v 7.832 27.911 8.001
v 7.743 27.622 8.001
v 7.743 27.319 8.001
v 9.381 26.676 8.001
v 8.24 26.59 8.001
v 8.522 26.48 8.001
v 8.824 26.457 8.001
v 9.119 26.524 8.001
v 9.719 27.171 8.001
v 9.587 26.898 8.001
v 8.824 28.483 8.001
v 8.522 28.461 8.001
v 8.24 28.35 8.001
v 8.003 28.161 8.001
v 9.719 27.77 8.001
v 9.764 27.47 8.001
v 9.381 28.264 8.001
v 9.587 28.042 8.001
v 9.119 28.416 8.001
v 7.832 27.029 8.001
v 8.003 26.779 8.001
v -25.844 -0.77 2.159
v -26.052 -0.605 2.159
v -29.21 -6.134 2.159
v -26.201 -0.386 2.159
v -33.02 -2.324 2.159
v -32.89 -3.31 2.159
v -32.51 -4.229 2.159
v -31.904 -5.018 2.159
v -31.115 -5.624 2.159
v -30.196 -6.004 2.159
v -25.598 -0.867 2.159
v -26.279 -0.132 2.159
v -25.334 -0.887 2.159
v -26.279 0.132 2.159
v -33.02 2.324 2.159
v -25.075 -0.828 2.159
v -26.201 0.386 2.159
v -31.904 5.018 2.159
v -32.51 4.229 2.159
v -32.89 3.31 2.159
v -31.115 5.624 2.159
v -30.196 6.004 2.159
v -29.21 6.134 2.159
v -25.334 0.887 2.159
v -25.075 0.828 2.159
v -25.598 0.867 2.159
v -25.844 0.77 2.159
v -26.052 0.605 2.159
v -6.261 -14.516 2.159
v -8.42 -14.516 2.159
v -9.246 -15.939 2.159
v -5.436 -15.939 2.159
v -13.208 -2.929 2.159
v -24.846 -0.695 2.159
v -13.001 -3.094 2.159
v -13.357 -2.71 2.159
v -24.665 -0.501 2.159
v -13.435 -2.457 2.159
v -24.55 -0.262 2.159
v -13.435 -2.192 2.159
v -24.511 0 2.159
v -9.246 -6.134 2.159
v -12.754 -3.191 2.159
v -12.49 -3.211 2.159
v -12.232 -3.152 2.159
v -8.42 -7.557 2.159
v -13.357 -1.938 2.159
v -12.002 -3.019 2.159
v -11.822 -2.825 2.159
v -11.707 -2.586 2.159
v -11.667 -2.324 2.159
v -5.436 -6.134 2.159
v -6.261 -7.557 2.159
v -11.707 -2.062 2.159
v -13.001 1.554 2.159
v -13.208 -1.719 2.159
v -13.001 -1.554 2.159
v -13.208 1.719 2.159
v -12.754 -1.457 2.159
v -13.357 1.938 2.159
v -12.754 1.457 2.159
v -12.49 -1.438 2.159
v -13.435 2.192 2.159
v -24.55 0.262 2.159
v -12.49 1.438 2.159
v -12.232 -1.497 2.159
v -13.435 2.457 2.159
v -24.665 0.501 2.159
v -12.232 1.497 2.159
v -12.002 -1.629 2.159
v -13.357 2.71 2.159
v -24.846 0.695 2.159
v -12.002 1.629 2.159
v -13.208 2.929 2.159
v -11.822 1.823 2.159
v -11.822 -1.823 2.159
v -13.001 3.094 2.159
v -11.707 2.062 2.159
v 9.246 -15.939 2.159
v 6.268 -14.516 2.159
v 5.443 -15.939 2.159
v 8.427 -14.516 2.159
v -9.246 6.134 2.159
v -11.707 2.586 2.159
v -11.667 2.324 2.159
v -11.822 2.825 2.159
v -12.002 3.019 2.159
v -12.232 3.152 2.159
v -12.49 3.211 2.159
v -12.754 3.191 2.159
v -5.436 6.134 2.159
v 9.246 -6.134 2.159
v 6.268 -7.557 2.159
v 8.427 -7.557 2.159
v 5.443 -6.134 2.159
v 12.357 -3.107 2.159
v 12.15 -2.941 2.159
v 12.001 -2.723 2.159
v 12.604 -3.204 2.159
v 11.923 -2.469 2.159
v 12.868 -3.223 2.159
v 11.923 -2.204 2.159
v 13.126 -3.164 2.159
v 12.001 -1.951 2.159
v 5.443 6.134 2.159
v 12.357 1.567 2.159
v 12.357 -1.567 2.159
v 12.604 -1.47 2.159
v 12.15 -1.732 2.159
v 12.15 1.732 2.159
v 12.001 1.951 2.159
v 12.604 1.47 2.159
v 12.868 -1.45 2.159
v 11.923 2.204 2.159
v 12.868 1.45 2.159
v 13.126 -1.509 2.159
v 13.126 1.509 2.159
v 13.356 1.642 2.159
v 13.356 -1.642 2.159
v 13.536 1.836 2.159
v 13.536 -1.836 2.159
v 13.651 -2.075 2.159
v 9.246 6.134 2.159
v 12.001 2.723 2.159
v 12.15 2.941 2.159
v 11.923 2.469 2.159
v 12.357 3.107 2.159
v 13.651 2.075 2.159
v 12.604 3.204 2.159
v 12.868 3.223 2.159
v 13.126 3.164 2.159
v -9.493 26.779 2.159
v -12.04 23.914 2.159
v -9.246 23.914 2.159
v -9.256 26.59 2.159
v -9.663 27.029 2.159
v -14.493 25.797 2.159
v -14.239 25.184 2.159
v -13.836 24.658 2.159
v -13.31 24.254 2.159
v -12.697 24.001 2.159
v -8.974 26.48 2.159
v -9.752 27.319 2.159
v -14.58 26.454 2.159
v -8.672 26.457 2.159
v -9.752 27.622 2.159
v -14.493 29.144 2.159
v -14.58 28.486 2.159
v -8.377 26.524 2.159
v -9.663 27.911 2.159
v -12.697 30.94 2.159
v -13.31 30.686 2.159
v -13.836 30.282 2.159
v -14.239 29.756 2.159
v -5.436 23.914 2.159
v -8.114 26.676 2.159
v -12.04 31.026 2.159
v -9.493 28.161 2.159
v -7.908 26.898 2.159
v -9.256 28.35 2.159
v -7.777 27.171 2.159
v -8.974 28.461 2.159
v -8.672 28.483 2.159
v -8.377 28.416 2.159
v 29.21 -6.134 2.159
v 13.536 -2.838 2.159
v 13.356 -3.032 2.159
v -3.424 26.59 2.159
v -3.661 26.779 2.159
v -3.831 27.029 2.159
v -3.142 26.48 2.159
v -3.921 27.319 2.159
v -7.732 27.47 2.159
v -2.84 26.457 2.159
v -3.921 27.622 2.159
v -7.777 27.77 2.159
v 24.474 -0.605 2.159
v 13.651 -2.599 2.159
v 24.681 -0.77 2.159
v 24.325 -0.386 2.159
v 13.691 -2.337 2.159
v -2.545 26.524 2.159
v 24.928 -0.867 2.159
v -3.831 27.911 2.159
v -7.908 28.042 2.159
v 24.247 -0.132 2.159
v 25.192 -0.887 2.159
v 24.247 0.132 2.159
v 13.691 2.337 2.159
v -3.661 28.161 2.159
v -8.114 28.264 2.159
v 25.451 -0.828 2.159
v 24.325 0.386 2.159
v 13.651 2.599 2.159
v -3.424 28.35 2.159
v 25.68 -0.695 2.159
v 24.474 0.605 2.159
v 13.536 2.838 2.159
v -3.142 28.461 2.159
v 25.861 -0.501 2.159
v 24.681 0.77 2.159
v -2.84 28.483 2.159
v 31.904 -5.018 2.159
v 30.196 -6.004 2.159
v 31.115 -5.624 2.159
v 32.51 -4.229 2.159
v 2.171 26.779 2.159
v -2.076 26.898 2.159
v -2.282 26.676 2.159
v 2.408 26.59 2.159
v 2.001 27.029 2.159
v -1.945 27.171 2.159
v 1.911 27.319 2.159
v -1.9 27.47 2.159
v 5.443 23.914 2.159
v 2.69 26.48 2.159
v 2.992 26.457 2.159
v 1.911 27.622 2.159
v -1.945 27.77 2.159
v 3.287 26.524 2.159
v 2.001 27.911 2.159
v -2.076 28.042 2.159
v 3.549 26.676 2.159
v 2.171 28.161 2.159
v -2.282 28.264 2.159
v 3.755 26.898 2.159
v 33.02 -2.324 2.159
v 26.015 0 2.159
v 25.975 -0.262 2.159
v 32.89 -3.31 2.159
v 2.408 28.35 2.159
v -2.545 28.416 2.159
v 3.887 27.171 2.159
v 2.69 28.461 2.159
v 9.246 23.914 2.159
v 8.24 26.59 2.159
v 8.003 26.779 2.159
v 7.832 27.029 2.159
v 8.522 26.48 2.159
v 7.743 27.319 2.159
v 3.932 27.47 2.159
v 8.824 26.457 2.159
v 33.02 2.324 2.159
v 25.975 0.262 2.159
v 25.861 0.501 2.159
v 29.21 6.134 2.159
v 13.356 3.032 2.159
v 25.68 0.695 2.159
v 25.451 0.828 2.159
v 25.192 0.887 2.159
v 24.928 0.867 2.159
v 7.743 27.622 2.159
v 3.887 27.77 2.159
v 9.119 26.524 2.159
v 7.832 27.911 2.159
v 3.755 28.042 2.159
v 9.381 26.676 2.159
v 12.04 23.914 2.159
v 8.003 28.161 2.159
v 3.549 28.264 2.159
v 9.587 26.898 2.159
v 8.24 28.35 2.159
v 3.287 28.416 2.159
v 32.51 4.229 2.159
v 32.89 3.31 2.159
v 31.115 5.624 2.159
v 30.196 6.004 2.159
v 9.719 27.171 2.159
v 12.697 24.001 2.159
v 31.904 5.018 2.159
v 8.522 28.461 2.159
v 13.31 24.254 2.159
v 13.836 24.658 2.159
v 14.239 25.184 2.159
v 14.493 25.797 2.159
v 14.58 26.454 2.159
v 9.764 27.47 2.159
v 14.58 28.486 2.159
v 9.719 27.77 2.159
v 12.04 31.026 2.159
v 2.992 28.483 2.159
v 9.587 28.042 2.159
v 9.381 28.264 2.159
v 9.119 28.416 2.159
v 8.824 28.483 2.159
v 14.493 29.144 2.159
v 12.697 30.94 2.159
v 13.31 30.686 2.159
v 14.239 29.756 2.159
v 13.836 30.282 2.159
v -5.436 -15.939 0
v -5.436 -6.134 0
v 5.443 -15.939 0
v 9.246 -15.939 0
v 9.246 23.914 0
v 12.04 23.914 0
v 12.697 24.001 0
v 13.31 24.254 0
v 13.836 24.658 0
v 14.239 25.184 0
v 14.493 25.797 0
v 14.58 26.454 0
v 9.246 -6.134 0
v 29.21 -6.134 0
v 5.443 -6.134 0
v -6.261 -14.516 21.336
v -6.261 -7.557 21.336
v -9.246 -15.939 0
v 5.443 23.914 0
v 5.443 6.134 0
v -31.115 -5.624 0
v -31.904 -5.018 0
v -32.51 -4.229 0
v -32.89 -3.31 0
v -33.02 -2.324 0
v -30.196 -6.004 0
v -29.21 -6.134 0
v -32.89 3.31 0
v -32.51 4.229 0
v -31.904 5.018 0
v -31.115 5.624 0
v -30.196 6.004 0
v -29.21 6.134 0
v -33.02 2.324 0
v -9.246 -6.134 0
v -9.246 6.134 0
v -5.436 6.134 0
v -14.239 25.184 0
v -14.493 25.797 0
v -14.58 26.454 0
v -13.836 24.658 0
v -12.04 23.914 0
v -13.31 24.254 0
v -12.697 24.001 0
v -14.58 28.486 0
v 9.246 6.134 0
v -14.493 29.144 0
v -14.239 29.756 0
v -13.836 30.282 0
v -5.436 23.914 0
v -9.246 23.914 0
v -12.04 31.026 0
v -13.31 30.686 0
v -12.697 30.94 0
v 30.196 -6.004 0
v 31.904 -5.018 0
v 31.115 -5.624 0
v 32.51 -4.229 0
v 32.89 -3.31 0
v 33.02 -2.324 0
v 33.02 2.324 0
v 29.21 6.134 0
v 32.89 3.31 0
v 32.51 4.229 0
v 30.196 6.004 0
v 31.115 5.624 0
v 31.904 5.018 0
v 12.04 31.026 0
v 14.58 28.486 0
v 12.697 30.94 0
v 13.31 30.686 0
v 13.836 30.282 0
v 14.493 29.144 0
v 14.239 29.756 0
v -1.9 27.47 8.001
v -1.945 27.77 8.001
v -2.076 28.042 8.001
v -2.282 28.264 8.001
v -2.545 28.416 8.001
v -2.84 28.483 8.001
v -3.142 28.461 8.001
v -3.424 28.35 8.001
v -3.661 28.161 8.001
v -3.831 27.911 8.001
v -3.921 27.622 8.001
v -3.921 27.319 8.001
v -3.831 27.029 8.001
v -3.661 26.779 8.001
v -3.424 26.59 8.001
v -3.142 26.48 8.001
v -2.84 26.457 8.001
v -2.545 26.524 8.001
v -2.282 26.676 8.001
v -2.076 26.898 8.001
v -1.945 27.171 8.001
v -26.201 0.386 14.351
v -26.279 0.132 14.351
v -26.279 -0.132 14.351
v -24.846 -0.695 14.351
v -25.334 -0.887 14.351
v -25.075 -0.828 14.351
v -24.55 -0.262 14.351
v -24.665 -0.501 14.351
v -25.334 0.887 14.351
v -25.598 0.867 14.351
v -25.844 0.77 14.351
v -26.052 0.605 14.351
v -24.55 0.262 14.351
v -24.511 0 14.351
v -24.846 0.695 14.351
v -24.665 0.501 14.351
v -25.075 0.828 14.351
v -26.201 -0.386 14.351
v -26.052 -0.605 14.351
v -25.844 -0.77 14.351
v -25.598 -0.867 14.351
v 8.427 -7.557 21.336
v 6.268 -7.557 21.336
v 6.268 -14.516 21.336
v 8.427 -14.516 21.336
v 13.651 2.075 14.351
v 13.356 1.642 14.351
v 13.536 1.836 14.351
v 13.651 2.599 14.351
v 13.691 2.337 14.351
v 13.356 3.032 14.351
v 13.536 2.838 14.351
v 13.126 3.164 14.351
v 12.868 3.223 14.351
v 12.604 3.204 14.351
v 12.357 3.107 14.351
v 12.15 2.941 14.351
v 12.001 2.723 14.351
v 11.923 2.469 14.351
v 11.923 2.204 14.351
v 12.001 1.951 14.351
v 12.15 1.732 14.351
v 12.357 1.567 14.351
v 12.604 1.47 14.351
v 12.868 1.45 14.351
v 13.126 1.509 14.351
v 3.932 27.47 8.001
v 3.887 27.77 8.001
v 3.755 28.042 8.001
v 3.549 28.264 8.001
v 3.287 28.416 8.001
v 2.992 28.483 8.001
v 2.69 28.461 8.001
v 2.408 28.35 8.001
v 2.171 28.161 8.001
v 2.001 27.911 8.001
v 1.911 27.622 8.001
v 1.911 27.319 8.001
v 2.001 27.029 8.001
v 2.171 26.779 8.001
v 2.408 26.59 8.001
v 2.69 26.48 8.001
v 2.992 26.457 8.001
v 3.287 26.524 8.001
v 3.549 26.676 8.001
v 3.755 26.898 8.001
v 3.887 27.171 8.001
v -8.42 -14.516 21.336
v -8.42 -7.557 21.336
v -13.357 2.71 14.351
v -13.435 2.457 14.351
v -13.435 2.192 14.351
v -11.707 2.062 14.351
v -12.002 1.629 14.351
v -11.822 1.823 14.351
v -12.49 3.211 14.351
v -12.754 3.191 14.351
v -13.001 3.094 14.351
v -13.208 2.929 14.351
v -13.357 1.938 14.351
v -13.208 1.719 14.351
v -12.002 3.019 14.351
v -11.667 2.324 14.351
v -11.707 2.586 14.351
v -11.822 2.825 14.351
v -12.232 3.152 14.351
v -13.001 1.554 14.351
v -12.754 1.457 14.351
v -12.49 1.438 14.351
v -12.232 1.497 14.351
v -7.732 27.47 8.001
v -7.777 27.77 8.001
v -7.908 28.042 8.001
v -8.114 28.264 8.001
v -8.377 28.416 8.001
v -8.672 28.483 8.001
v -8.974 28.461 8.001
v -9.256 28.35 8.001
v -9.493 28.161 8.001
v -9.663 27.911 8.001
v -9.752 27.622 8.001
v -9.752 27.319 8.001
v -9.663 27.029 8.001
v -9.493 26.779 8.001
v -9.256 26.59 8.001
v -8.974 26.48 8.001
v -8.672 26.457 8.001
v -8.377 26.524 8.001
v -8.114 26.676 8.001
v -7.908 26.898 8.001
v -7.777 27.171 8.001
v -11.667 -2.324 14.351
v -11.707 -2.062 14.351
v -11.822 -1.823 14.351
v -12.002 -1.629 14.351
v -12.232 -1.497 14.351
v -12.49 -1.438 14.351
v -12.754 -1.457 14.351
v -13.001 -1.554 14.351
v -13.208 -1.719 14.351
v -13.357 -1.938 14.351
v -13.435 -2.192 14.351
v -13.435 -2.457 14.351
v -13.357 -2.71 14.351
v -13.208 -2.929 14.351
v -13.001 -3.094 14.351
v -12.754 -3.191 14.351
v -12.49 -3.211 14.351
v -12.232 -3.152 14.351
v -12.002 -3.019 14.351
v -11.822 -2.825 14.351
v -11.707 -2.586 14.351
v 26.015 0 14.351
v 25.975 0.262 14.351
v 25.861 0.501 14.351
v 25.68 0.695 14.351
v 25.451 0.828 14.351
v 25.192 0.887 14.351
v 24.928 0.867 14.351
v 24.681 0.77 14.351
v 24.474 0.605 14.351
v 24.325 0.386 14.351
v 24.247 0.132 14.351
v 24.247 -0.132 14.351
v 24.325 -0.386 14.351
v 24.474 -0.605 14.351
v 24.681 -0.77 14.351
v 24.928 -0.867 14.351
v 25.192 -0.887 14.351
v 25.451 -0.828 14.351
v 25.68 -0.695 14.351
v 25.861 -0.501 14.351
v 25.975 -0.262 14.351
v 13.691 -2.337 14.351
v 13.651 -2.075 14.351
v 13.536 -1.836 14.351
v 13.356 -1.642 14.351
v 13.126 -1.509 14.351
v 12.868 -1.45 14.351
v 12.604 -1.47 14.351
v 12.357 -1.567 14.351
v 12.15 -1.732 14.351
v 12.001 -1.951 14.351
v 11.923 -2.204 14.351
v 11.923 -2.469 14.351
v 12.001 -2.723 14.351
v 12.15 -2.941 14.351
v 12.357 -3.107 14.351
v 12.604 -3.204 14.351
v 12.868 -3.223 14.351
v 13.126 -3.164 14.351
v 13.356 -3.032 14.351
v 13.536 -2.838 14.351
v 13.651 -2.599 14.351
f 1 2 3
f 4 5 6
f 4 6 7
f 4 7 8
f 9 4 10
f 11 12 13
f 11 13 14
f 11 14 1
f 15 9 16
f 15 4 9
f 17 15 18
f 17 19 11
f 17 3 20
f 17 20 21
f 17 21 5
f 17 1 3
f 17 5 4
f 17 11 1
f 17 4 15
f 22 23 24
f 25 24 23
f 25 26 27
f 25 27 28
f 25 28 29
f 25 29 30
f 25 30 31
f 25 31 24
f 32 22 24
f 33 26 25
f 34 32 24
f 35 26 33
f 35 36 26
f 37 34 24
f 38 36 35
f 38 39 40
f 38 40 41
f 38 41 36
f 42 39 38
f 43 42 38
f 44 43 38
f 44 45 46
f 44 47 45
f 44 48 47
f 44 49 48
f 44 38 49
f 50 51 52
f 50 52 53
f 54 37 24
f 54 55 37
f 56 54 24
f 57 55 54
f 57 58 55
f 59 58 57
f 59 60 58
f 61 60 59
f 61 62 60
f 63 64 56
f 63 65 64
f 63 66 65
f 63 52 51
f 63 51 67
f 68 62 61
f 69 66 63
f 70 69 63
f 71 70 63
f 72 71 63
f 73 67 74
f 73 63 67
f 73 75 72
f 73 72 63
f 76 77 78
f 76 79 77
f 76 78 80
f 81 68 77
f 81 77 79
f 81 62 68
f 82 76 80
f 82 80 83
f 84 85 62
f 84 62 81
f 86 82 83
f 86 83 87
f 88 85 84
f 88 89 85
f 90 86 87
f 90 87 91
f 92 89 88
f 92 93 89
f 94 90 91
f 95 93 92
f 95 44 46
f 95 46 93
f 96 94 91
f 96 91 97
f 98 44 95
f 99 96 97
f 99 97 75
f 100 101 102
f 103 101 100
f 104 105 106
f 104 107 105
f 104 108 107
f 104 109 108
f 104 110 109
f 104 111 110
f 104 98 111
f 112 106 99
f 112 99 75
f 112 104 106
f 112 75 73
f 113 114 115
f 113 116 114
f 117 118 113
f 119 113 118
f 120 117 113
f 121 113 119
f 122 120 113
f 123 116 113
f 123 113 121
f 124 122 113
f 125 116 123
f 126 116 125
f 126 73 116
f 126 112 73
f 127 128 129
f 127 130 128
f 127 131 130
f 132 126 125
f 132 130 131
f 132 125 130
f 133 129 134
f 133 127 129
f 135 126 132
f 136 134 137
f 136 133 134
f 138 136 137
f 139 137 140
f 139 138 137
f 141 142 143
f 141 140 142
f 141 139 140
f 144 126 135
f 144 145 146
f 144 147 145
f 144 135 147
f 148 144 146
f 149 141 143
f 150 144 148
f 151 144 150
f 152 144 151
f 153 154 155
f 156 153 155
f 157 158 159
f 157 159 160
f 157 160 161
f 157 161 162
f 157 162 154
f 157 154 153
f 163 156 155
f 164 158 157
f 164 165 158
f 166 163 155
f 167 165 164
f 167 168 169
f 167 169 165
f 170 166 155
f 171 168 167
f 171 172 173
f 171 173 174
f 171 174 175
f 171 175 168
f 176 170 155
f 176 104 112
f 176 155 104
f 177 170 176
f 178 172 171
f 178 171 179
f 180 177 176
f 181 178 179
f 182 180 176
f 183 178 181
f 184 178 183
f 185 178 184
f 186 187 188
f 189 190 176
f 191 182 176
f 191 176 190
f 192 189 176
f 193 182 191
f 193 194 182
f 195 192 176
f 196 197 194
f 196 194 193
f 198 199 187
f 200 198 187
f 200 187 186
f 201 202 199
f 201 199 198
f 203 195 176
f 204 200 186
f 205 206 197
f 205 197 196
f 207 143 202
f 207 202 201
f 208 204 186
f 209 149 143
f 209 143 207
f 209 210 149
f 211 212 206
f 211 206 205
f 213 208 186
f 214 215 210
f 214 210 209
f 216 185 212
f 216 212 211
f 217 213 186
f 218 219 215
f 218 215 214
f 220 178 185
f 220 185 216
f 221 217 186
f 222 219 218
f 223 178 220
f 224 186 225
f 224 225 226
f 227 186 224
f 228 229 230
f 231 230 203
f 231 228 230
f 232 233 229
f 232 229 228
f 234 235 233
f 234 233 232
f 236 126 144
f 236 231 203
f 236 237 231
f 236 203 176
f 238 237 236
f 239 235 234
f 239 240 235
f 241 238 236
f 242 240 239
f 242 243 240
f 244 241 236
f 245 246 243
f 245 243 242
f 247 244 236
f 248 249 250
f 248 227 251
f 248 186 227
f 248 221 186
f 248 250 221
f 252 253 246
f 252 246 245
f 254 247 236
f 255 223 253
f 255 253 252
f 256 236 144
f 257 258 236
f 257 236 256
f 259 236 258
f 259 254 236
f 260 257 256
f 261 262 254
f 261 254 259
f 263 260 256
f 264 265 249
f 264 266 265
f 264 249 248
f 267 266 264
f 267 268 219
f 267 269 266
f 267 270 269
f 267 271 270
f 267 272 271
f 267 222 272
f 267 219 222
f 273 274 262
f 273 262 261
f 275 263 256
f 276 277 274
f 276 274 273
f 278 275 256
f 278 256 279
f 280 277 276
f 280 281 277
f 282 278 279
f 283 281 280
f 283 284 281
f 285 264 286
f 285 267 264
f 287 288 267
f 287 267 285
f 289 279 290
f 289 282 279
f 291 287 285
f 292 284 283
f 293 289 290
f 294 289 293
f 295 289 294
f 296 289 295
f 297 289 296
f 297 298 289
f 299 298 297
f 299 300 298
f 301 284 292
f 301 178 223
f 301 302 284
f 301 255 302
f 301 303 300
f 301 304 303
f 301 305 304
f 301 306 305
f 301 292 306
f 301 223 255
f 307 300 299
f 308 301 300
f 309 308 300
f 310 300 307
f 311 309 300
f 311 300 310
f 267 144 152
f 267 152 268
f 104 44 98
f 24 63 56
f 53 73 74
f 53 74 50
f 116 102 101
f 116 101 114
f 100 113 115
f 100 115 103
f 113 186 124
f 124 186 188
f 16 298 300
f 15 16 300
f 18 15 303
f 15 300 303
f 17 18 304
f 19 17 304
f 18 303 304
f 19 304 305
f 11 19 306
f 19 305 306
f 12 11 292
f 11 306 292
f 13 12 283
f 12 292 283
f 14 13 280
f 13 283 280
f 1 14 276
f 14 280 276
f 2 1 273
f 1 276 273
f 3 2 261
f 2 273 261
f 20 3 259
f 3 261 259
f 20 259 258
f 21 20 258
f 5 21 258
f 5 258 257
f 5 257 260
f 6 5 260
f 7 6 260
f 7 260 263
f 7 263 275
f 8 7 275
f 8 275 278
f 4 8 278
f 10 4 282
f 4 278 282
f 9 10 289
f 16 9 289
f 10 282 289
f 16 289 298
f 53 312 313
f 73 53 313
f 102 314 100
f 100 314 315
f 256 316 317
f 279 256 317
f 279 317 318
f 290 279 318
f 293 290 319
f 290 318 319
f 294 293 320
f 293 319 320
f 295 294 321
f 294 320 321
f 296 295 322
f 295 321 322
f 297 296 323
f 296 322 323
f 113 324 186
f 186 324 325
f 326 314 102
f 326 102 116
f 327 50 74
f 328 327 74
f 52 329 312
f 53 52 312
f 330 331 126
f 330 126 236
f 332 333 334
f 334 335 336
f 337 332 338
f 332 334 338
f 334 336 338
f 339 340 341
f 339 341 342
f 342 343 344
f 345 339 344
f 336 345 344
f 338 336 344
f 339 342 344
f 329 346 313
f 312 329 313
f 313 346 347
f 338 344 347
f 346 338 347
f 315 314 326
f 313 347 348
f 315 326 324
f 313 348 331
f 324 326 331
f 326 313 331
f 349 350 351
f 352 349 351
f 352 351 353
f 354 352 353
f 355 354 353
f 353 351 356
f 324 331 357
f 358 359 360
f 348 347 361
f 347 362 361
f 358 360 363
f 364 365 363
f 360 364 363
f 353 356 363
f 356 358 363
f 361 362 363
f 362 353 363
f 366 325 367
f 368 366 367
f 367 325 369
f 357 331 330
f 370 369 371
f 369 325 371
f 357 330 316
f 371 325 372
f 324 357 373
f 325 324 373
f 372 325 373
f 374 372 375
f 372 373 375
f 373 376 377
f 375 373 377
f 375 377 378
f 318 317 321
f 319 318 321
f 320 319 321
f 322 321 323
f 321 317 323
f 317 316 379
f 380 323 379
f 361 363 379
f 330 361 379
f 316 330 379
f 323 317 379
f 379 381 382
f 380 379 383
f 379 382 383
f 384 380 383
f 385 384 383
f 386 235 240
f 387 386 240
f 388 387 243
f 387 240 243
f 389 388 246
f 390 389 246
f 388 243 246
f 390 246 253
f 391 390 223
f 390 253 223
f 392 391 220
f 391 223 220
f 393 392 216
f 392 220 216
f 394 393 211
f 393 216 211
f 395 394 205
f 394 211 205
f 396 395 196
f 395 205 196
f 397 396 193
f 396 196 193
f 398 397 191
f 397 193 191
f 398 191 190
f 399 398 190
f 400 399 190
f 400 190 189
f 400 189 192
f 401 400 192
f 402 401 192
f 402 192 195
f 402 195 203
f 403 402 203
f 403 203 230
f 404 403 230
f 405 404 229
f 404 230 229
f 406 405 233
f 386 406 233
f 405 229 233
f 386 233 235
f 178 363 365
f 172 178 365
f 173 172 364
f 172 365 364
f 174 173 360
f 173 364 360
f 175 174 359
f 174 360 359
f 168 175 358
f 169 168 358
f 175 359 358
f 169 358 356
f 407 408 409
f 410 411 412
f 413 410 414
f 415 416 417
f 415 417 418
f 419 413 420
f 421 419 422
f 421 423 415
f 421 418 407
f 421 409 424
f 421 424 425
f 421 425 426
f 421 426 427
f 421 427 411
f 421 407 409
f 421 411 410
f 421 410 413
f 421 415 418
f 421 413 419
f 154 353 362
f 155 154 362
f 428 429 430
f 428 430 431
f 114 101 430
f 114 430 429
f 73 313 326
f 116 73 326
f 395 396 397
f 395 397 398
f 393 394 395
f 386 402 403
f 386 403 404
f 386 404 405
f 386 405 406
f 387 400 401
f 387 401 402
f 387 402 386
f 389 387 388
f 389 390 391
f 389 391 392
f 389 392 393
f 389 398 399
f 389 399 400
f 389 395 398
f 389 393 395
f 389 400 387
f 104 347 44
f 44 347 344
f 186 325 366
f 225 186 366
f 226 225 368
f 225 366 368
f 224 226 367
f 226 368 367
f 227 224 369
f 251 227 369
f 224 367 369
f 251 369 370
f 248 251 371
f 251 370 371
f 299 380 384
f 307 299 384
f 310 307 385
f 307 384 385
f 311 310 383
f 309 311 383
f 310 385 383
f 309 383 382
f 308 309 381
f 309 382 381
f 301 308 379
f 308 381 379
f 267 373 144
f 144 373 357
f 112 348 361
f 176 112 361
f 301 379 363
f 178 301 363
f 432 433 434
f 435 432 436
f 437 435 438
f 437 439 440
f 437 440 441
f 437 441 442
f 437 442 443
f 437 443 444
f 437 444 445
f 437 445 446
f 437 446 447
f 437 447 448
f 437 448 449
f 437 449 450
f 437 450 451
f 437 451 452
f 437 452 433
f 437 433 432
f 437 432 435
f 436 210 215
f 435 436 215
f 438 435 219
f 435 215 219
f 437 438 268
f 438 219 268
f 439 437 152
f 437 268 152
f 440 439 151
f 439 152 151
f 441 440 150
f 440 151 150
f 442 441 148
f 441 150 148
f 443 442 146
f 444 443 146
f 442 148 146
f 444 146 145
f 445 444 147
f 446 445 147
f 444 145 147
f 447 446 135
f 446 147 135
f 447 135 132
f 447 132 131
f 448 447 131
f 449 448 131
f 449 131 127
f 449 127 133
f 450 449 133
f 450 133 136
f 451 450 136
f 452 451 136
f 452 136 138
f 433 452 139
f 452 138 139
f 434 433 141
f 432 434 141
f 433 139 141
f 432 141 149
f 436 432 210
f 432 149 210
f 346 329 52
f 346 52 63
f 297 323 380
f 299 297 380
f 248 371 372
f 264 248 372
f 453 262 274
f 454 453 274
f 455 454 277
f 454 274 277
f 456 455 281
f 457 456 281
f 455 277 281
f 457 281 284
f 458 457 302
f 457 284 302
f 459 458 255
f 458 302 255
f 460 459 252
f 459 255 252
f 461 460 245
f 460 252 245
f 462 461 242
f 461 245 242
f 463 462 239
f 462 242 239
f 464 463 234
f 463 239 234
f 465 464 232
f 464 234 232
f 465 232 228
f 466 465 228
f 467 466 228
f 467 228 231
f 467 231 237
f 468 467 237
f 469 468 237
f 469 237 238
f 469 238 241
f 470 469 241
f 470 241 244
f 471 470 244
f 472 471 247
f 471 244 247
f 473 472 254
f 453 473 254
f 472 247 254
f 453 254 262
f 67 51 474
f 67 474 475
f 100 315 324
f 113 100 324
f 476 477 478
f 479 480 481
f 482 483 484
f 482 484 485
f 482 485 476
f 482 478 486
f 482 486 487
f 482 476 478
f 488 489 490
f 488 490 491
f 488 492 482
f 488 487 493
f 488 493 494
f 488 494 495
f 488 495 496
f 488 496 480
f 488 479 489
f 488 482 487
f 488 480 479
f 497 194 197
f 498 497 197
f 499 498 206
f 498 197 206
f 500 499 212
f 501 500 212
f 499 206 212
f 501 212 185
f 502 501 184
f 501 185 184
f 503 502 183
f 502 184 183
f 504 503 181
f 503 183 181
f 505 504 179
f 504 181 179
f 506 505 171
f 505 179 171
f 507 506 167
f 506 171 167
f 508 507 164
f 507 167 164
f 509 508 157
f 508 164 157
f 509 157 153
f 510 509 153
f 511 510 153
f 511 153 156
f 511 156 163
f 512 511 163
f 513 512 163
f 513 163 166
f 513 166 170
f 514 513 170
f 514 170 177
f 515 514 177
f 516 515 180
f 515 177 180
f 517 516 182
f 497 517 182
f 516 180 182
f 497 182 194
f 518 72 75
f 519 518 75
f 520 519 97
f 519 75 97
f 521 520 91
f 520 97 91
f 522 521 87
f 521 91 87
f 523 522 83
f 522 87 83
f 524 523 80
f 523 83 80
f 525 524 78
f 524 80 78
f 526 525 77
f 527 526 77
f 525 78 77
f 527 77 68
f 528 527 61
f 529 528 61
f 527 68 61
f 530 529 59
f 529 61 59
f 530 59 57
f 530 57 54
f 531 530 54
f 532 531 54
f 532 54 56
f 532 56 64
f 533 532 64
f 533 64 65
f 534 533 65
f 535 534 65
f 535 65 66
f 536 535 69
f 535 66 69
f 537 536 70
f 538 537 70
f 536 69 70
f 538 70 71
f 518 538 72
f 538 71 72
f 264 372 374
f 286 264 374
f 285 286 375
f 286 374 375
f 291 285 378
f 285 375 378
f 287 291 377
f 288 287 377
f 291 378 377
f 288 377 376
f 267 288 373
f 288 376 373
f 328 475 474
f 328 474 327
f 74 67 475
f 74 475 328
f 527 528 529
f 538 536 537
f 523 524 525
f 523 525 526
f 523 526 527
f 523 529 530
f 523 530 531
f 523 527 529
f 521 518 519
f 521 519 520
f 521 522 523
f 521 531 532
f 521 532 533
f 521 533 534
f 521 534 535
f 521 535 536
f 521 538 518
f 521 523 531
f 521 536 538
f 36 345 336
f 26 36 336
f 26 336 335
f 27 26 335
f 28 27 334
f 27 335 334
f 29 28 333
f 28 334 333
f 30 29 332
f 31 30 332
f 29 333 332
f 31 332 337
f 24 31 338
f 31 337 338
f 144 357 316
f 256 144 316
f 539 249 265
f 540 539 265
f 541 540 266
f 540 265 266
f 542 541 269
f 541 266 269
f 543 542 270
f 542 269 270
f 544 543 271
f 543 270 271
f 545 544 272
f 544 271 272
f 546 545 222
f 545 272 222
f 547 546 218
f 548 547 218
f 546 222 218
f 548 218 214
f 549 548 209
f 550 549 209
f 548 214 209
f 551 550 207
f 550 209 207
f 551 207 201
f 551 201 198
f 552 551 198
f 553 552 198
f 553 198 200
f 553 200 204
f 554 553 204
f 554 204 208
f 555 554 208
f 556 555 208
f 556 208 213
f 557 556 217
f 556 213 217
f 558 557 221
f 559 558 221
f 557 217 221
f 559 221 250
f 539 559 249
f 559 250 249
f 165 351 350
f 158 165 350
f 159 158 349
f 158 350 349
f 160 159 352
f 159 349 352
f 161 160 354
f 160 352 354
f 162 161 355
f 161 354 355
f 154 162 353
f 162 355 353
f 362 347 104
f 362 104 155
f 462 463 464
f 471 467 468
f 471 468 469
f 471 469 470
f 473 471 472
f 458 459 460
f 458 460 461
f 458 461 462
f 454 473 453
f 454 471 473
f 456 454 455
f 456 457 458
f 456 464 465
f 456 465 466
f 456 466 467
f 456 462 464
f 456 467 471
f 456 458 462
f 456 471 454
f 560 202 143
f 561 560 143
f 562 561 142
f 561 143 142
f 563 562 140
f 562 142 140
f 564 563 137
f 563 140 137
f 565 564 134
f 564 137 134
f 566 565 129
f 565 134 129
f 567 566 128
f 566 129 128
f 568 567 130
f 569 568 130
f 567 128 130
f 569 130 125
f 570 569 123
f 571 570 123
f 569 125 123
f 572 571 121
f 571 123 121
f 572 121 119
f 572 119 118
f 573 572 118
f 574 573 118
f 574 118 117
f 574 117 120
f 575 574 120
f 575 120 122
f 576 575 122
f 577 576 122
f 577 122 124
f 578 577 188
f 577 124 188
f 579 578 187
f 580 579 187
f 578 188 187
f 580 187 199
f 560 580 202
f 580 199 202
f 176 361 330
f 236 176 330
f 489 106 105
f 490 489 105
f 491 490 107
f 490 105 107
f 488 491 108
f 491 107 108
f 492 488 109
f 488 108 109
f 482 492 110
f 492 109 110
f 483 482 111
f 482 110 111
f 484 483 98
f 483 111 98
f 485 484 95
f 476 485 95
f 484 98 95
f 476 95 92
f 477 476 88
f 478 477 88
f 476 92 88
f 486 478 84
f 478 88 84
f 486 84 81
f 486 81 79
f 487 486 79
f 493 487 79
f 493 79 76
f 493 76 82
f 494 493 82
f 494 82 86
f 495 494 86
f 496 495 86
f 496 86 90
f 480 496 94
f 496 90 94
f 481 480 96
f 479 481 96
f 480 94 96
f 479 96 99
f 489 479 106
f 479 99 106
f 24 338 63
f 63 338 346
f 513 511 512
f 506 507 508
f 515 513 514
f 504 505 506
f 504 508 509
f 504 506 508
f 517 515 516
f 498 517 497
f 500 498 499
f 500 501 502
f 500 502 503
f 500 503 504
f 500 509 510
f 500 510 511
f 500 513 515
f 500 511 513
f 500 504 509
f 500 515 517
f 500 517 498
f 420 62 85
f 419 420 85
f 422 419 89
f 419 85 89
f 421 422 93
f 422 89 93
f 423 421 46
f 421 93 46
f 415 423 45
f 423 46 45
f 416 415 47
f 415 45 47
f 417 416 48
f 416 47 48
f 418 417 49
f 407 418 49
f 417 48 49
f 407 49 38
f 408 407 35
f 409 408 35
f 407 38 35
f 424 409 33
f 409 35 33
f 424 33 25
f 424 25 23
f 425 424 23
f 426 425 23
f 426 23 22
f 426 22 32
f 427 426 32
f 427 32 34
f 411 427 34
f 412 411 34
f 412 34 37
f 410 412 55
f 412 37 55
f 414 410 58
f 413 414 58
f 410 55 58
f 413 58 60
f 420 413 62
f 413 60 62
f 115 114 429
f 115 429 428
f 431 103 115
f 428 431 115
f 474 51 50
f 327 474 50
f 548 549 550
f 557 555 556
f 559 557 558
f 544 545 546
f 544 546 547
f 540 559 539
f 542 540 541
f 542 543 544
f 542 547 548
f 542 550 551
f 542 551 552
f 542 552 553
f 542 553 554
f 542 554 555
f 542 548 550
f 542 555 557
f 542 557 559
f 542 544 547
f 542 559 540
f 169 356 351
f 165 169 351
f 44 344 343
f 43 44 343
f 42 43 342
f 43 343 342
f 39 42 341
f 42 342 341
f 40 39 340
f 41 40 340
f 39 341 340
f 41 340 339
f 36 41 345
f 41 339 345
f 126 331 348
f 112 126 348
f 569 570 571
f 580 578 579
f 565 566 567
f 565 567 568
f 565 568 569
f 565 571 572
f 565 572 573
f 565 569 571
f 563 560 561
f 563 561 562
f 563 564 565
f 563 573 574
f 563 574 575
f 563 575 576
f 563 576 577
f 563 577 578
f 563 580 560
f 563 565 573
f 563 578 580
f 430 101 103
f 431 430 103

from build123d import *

# Parameters (mm, degrees)
F0_W     = 3.81
F0_H     = 17.78
F0_W_2   = 3.802742
F0_H_2   = 9.8044
F1_DEPTH = 2.159
F2_R     = 0.889
F3_DEPTH = 12.192
F4_R     = 1.016
F5_DEPTH = 5.842
F6_W     = 2.159
F6_H     = 6.9596
F7_DEPTH = 19.177


with BuildPart() as f1:
    # F0 (on Top) → F1 (new body)
    with BuildSketch(Plane.XY):
        with BuildLine():
            Line((9.2456, -6.1341), (29.21, -6.1341))
            ThreePointArc((29.21, -6.1341), (31.904077, -5.018177), (33.02, -2.3241))
            Line((33.02, -2.3241), (33.02, 2.3241))
            ThreePointArc((33.02, 2.3241), (31.904077, 5.018177), (29.21, 6.1341))
            Line((29.21, 6.1341), (9.2456, 6.1341))
            Line((9.2456, 6.1341), (5.442858, 6.1341))
            Line((5.442858, 6.1341), (-5.4356, 6.1341))
            Line((-5.4356, 6.1341), (-9.2456, 6.1341))
            Line((-9.2456, 6.1341), (-29.21, 6.1341))
            ThreePointArc((-29.21, 6.1341), (-31.904077, 5.018177), (-33.02, 2.3241))
            Line((-33.02, 2.3241), (-33.02, -2.3241))
            ThreePointArc((-33.02, -2.3241), (-31.904077, -5.018177), (-29.21, -6.1341))
            Line((-29.21, -6.1341), (-9.2456, -6.1341))
            Line((-9.2456, -6.1341), (-5.4356, -6.1341))
            Line((-5.4356, -6.1341), (5.442858, -6.1341))
            Line((5.442858, -6.1341), (9.2456, -6.1341))
        make_face()
        with Locations((-7.3406, 15.0241)):
            Rectangle(F0_W, F0_H)
        with BuildLine():
            Line((5.442858, 23.9141), (9.2456, 23.9141))
            Line((9.2456, 23.9141), (12.0396, 23.9141))
            ThreePointArc((12.0396, 23.9141), (13.835651, 24.658049), (14.5796, 26.4541))
            Line((14.5796, 26.4541), (14.5796, 28.4861))
            ThreePointArc((14.5796, 28.4861), (13.835651, 30.282151), (12.0396, 31.0261))
            Line((12.0396, 31.0261), (-12.0396, 31.0261))
            ThreePointArc((-12.0396, 31.0261), (-13.835651, 30.282151), (-14.5796, 28.4861))
            Line((-14.5796, 28.4861), (-14.5796, 26.4541))
            ThreePointArc((-14.5796, 26.4541), (-13.835651, 24.658049), (-12.0396, 23.9141))
            Line((-12.0396, 23.9141), (-9.2456, 23.9141))
            Line((-9.2456, 23.9141), (-5.4356, 23.9141))
            Line((-5.4356, 23.9141), (0, 23.9141))
            Line((0, 23.9141), (5.442858, 23.9141))
        make_face()
        with Locations((7.344229, 15.0241)):
            Rectangle(F0_W_2, F0_H)
        with Locations((7.344229, -11.0363)):
            Rectangle(F0_W_2, F0_H_2)
        with Locations((-7.3406, -11.0363)):
            Rectangle(F0_W, F0_H_2)
    extrude(amount=F1_DEPTH)

    # F2 (on face) → F3 (join)
    with BuildSketch(Plane.XY.offset(2.159)):
        with Locations((-25.4, 0)):
            Circle(F2_R)
        with Locations((-12.556378, -2.3241)):
            Circle(F2_R)
        with Locations((-12.556378, 2.3241)):
            Circle(F2_R)
        with Locations((25.125987, 0)):
            Circle(F2_R)
        with Locations((12.8016, 2.3368)):
            Circle(F2_R)
        with Locations((12.8016, -2.3368)):
            Circle(F2_R)
    extrude(amount=F3_DEPTH)

    # F4 (on face) → F5 (join)
    with BuildSketch(Plane.XY.offset(2.159)):
        with Locations((-8.74776, 27.4701)):
            Circle(F4_R)
        with Locations((-2.91592, 27.4701)):
            Circle(F4_R)
        with Locations((2.91592, 27.4701)):
            Circle(F4_R)
        with Locations((8.74776, 27.4701)):
            Circle(F4_R)
    extrude(amount=F5_DEPTH)

    # F6 (on face) → F7 (join)
    with BuildSketch(Plane.XY.offset(2.159)):
        with Locations((-7.3406, -11.0363)):
            Rectangle(F6_W, F6_H)
        with Locations((7.347858, -11.0363)):
            Rectangle(F6_W, F6_H)
    extrude(amount=F7_DEPTH)


solid = f1.part
